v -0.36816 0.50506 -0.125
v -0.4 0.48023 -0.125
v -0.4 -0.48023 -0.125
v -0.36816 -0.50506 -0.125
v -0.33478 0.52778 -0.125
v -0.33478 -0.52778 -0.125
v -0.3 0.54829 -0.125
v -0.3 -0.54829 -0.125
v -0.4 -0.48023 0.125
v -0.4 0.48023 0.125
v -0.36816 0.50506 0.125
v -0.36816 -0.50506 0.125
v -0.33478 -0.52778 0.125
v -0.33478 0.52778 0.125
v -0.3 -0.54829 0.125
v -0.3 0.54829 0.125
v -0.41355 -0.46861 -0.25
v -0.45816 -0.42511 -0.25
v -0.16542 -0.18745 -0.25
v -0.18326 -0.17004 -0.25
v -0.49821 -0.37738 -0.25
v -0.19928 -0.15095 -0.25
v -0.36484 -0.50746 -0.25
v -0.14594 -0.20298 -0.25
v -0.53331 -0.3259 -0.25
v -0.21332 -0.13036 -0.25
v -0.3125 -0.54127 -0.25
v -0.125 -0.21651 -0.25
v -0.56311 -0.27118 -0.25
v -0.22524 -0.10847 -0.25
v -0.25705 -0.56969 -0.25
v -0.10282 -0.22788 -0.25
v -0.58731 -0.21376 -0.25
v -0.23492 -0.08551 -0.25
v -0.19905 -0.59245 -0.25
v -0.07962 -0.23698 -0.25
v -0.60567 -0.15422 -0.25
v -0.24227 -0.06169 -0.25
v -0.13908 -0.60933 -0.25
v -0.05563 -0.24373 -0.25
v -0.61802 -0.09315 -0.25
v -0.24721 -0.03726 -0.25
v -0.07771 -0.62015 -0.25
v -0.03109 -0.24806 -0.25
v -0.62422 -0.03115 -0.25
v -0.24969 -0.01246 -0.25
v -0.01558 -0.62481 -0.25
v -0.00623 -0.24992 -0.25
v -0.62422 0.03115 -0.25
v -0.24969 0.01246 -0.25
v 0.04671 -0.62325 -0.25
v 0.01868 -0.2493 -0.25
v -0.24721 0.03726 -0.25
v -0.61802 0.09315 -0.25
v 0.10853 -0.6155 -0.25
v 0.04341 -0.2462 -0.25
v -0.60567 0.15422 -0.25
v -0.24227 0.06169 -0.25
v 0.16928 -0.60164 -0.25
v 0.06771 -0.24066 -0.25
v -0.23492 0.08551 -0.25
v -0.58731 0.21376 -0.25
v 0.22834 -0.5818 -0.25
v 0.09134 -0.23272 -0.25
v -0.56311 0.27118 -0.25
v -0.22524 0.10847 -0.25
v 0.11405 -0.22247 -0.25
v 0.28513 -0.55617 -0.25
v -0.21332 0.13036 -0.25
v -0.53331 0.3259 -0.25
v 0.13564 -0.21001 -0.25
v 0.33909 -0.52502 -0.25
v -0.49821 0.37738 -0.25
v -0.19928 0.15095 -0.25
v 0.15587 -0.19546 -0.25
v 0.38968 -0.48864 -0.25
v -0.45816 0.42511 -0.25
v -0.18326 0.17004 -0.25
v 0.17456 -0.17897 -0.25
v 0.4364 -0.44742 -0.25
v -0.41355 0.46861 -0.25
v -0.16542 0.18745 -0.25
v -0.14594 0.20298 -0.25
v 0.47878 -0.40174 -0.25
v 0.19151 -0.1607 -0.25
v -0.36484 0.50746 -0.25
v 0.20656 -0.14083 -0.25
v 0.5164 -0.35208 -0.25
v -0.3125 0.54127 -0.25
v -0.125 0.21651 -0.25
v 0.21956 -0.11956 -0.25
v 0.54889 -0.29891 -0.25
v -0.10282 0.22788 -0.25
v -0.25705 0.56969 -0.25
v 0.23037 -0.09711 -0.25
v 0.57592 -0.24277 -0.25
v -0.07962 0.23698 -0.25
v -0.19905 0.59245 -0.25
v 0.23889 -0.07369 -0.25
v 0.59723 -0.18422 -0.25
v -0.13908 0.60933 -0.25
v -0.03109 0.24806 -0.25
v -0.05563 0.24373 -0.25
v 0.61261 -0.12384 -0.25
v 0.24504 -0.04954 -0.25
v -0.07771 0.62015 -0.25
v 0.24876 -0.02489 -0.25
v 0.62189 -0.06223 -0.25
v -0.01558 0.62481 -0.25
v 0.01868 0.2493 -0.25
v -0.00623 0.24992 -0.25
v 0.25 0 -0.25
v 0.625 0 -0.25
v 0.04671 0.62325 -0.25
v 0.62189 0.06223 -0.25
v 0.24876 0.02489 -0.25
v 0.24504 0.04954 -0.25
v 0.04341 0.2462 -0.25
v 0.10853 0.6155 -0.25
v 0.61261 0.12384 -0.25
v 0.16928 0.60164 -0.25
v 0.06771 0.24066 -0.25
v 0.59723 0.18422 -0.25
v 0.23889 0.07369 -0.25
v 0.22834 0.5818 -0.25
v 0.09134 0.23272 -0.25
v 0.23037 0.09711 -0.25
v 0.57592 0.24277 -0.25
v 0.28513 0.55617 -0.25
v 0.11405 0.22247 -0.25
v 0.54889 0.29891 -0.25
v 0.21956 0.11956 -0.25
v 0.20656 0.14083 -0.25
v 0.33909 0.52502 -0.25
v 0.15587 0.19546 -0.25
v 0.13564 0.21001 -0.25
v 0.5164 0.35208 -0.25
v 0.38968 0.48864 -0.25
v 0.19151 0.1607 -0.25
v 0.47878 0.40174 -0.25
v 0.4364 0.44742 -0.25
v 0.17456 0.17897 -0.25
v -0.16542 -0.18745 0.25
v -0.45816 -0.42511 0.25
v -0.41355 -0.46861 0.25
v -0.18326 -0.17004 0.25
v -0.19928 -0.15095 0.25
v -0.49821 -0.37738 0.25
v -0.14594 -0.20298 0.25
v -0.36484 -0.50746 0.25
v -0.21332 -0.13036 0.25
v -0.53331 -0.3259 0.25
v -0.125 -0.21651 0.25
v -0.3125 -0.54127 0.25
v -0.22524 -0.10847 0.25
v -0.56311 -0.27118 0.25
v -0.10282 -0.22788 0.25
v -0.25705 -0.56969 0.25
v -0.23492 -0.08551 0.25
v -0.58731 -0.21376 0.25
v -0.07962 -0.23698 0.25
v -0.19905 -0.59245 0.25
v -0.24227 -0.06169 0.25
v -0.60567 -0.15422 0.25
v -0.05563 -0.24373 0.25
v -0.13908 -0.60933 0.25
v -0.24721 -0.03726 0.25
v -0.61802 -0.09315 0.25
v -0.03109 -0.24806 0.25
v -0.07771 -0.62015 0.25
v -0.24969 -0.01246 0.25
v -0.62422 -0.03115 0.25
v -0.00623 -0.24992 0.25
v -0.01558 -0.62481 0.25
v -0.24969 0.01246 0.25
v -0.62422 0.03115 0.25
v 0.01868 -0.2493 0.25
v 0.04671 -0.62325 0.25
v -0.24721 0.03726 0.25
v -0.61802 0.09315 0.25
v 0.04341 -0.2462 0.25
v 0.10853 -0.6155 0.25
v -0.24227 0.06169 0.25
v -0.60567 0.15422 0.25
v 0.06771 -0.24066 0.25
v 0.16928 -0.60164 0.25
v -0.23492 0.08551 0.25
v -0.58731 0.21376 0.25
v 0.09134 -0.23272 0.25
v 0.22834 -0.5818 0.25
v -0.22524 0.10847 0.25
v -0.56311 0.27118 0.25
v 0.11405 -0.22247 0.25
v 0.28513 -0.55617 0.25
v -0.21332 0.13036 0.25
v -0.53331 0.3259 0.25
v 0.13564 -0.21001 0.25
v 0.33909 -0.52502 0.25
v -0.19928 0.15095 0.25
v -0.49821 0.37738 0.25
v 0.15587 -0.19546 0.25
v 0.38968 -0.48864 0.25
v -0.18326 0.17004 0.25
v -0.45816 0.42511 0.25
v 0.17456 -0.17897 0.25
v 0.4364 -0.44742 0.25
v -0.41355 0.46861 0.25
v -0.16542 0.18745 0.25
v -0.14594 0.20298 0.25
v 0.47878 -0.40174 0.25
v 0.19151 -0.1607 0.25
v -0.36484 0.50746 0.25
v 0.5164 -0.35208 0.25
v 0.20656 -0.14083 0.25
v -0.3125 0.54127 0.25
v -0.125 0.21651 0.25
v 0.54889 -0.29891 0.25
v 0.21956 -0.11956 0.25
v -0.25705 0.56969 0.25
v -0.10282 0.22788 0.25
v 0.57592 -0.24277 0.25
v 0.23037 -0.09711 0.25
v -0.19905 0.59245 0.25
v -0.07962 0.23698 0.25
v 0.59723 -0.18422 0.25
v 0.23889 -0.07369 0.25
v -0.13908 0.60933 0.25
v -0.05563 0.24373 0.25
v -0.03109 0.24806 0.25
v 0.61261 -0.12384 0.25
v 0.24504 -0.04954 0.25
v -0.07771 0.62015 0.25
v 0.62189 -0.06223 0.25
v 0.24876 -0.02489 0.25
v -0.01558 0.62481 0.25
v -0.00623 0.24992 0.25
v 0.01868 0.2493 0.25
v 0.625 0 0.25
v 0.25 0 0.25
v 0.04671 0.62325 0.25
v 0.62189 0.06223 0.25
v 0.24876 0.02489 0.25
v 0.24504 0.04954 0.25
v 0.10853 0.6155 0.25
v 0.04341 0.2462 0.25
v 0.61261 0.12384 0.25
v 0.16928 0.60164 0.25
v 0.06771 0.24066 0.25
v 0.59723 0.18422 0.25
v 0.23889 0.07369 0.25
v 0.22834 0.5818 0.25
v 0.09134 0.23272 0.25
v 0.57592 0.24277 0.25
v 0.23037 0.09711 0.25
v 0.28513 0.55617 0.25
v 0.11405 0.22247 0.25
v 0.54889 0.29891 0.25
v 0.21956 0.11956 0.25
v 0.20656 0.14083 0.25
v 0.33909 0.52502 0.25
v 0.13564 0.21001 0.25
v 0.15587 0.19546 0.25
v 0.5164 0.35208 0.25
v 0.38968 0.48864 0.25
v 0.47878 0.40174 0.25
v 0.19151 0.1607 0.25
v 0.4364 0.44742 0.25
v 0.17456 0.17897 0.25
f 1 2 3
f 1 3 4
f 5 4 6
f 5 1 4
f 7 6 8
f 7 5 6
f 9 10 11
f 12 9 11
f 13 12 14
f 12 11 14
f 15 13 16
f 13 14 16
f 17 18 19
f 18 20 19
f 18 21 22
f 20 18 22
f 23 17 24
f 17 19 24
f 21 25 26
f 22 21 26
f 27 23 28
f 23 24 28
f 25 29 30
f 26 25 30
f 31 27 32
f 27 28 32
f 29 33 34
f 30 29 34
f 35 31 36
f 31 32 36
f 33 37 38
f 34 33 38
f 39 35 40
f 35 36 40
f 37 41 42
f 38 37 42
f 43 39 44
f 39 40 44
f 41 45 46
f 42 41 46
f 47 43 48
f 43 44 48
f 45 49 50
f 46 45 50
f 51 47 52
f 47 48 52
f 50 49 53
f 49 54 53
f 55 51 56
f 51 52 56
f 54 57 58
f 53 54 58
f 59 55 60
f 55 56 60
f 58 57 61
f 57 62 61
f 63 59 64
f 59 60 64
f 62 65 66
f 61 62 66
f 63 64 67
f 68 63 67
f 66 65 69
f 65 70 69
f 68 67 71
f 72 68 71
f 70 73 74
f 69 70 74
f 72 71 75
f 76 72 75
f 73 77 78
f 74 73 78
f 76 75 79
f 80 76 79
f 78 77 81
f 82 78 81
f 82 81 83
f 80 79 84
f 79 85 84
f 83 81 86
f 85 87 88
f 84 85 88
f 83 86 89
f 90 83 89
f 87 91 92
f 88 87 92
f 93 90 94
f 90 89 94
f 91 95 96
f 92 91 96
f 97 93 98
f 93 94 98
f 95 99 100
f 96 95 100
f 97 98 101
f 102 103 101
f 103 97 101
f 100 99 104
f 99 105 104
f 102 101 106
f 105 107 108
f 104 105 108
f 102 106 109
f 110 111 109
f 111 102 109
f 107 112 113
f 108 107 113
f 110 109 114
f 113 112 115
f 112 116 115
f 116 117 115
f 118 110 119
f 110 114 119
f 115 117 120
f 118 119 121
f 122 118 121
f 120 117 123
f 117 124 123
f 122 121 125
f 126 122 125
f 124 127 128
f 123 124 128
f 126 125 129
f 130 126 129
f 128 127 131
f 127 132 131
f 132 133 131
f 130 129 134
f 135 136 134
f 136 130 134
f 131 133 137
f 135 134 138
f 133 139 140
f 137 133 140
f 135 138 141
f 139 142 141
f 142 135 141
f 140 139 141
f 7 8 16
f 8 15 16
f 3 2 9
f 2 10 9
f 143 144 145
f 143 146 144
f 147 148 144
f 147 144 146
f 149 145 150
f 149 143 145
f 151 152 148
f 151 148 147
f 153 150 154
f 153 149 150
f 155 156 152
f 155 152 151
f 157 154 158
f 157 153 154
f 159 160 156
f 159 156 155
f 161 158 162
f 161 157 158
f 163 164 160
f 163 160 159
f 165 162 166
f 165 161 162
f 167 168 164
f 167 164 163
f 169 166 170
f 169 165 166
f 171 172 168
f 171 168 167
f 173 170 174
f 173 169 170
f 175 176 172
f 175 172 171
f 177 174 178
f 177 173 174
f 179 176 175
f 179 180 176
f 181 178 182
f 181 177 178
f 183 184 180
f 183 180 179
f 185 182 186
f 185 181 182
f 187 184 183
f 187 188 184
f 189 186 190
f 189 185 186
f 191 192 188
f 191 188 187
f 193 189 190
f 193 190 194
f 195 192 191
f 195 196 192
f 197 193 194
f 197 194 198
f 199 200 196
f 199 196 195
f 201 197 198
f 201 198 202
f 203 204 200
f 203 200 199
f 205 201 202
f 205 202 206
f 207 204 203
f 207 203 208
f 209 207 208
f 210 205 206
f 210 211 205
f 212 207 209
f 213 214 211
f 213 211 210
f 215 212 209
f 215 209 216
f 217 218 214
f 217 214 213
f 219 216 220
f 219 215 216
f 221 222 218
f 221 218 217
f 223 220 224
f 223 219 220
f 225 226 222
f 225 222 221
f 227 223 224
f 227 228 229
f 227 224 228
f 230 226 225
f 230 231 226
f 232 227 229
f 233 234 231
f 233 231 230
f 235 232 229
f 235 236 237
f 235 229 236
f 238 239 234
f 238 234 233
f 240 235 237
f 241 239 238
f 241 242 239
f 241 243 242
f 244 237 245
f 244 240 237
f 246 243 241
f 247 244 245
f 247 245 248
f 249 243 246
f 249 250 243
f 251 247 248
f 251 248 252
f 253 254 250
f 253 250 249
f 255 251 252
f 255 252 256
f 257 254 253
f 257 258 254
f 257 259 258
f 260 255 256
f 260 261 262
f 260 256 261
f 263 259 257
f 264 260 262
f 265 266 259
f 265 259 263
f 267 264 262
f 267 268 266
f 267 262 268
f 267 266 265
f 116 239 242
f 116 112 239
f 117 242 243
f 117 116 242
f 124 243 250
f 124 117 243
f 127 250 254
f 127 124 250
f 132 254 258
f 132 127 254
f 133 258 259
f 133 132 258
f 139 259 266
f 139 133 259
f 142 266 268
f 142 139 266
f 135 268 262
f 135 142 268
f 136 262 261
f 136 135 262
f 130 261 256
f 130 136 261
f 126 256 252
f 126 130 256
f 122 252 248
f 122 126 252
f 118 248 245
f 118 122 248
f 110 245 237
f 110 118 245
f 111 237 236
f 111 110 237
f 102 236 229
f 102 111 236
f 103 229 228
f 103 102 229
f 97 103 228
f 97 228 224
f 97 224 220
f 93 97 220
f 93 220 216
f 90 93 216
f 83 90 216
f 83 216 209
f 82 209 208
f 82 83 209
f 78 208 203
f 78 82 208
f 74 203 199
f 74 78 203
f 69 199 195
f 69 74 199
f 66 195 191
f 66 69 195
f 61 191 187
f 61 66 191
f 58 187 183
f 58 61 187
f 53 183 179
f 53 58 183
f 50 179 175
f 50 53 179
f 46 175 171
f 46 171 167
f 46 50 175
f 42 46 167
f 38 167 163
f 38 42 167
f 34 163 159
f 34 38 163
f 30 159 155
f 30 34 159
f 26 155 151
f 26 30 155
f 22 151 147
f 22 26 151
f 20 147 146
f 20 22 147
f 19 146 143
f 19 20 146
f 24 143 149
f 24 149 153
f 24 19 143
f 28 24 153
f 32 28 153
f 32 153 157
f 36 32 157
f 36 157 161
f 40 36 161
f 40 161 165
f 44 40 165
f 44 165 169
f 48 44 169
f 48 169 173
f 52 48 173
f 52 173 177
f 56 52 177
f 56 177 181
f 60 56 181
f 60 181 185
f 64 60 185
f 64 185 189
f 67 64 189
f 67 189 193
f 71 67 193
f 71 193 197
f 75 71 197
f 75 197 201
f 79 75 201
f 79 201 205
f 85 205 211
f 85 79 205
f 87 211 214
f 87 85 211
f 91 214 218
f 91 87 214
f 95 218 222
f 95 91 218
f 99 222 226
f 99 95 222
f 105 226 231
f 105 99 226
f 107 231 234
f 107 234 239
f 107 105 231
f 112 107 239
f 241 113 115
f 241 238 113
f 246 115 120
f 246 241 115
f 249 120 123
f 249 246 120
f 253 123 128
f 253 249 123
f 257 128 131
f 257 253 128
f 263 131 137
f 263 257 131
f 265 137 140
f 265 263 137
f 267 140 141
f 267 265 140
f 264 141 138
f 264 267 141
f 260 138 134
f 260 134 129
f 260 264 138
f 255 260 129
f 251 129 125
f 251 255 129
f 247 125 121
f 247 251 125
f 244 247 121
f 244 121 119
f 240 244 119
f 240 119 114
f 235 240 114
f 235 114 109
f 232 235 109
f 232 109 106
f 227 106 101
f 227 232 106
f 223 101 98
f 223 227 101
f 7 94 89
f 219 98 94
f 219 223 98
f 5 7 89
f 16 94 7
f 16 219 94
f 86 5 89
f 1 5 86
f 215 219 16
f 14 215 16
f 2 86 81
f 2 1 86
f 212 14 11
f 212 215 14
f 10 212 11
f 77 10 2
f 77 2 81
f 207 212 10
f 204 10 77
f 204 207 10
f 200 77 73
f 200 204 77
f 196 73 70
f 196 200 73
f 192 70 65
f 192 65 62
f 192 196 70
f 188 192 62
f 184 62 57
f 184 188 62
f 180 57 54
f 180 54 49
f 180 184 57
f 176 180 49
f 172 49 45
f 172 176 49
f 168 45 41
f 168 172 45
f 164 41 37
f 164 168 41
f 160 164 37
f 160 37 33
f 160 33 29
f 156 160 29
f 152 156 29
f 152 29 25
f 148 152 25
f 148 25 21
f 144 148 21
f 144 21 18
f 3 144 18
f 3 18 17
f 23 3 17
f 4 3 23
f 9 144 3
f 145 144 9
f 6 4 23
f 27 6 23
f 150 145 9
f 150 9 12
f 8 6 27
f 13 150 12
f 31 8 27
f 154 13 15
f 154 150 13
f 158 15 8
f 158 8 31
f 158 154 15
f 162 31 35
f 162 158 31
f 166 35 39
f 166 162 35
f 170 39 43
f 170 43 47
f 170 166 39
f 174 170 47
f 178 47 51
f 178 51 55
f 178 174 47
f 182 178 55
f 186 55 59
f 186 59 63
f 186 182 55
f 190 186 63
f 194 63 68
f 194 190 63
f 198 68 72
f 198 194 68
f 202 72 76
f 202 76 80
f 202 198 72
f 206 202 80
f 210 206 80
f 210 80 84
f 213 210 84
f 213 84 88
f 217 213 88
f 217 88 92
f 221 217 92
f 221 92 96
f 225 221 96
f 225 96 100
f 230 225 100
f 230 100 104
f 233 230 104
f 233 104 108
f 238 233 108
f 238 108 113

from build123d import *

# Parameters (mm, degrees)
SALIENTE_EXTRUIR1_DEPTH      = 0.25
SALIENTE_EXTRUIR1_DEPTH_BACK = 0.25
CROQUIS1_R                   = 0.625
CROQUIS1_R_2                 = 0.25
CORTAR_EXTRUIR1_DEPTH        = 0.125
CORTAR_EXTRUIR1_DEPTH_BACK   = 0.125


with BuildPart() as part:
    # Croquis1 → Saliente-Extruir1 (new, two sides: drawn at the far end of the back side and taken through both)
    with BuildSketch(Plane.XY.offset(-SALIENTE_EXTRUIR1_DEPTH_BACK)):
        Circle(CROQUIS1_R)
        Circle(CROQUIS1_R_2, mode=Mode.SUBTRACT)
    extrude(amount=SALIENTE_EXTRUIR1_DEPTH + SALIENTE_EXTRUIR1_DEPTH_BACK)

    # Croquis2 → Cortar-Extruir1 (cut, two sides: drawn at the far end of the back side and taken through both)
    with BuildSketch(Plane.XY.offset(-CORTAR_EXTRUIR1_DEPTH_BACK)):
        with BuildLine():
            Line((-0.3, -0.548292805), (-0.3, 0.548292805))
            ThreePointArc((-0.3, 0.548292805), (-0.35165038, 0.516688504), (-0.4, 0.480234318))
            Line((-0.4, 0.480234318), (-0.4, -0.480234318))
            ThreePointArc((-0.4, -0.480234318), (-0.35165038, -0.516688504), (-0.3, -0.548292805))
        make_face()
    extrude(amount=CORTAR_EXTRUIR1_DEPTH + CORTAR_EXTRUIR1_DEPTH_BACK, mode=Mode.SUBTRACT)


solid = part.part
